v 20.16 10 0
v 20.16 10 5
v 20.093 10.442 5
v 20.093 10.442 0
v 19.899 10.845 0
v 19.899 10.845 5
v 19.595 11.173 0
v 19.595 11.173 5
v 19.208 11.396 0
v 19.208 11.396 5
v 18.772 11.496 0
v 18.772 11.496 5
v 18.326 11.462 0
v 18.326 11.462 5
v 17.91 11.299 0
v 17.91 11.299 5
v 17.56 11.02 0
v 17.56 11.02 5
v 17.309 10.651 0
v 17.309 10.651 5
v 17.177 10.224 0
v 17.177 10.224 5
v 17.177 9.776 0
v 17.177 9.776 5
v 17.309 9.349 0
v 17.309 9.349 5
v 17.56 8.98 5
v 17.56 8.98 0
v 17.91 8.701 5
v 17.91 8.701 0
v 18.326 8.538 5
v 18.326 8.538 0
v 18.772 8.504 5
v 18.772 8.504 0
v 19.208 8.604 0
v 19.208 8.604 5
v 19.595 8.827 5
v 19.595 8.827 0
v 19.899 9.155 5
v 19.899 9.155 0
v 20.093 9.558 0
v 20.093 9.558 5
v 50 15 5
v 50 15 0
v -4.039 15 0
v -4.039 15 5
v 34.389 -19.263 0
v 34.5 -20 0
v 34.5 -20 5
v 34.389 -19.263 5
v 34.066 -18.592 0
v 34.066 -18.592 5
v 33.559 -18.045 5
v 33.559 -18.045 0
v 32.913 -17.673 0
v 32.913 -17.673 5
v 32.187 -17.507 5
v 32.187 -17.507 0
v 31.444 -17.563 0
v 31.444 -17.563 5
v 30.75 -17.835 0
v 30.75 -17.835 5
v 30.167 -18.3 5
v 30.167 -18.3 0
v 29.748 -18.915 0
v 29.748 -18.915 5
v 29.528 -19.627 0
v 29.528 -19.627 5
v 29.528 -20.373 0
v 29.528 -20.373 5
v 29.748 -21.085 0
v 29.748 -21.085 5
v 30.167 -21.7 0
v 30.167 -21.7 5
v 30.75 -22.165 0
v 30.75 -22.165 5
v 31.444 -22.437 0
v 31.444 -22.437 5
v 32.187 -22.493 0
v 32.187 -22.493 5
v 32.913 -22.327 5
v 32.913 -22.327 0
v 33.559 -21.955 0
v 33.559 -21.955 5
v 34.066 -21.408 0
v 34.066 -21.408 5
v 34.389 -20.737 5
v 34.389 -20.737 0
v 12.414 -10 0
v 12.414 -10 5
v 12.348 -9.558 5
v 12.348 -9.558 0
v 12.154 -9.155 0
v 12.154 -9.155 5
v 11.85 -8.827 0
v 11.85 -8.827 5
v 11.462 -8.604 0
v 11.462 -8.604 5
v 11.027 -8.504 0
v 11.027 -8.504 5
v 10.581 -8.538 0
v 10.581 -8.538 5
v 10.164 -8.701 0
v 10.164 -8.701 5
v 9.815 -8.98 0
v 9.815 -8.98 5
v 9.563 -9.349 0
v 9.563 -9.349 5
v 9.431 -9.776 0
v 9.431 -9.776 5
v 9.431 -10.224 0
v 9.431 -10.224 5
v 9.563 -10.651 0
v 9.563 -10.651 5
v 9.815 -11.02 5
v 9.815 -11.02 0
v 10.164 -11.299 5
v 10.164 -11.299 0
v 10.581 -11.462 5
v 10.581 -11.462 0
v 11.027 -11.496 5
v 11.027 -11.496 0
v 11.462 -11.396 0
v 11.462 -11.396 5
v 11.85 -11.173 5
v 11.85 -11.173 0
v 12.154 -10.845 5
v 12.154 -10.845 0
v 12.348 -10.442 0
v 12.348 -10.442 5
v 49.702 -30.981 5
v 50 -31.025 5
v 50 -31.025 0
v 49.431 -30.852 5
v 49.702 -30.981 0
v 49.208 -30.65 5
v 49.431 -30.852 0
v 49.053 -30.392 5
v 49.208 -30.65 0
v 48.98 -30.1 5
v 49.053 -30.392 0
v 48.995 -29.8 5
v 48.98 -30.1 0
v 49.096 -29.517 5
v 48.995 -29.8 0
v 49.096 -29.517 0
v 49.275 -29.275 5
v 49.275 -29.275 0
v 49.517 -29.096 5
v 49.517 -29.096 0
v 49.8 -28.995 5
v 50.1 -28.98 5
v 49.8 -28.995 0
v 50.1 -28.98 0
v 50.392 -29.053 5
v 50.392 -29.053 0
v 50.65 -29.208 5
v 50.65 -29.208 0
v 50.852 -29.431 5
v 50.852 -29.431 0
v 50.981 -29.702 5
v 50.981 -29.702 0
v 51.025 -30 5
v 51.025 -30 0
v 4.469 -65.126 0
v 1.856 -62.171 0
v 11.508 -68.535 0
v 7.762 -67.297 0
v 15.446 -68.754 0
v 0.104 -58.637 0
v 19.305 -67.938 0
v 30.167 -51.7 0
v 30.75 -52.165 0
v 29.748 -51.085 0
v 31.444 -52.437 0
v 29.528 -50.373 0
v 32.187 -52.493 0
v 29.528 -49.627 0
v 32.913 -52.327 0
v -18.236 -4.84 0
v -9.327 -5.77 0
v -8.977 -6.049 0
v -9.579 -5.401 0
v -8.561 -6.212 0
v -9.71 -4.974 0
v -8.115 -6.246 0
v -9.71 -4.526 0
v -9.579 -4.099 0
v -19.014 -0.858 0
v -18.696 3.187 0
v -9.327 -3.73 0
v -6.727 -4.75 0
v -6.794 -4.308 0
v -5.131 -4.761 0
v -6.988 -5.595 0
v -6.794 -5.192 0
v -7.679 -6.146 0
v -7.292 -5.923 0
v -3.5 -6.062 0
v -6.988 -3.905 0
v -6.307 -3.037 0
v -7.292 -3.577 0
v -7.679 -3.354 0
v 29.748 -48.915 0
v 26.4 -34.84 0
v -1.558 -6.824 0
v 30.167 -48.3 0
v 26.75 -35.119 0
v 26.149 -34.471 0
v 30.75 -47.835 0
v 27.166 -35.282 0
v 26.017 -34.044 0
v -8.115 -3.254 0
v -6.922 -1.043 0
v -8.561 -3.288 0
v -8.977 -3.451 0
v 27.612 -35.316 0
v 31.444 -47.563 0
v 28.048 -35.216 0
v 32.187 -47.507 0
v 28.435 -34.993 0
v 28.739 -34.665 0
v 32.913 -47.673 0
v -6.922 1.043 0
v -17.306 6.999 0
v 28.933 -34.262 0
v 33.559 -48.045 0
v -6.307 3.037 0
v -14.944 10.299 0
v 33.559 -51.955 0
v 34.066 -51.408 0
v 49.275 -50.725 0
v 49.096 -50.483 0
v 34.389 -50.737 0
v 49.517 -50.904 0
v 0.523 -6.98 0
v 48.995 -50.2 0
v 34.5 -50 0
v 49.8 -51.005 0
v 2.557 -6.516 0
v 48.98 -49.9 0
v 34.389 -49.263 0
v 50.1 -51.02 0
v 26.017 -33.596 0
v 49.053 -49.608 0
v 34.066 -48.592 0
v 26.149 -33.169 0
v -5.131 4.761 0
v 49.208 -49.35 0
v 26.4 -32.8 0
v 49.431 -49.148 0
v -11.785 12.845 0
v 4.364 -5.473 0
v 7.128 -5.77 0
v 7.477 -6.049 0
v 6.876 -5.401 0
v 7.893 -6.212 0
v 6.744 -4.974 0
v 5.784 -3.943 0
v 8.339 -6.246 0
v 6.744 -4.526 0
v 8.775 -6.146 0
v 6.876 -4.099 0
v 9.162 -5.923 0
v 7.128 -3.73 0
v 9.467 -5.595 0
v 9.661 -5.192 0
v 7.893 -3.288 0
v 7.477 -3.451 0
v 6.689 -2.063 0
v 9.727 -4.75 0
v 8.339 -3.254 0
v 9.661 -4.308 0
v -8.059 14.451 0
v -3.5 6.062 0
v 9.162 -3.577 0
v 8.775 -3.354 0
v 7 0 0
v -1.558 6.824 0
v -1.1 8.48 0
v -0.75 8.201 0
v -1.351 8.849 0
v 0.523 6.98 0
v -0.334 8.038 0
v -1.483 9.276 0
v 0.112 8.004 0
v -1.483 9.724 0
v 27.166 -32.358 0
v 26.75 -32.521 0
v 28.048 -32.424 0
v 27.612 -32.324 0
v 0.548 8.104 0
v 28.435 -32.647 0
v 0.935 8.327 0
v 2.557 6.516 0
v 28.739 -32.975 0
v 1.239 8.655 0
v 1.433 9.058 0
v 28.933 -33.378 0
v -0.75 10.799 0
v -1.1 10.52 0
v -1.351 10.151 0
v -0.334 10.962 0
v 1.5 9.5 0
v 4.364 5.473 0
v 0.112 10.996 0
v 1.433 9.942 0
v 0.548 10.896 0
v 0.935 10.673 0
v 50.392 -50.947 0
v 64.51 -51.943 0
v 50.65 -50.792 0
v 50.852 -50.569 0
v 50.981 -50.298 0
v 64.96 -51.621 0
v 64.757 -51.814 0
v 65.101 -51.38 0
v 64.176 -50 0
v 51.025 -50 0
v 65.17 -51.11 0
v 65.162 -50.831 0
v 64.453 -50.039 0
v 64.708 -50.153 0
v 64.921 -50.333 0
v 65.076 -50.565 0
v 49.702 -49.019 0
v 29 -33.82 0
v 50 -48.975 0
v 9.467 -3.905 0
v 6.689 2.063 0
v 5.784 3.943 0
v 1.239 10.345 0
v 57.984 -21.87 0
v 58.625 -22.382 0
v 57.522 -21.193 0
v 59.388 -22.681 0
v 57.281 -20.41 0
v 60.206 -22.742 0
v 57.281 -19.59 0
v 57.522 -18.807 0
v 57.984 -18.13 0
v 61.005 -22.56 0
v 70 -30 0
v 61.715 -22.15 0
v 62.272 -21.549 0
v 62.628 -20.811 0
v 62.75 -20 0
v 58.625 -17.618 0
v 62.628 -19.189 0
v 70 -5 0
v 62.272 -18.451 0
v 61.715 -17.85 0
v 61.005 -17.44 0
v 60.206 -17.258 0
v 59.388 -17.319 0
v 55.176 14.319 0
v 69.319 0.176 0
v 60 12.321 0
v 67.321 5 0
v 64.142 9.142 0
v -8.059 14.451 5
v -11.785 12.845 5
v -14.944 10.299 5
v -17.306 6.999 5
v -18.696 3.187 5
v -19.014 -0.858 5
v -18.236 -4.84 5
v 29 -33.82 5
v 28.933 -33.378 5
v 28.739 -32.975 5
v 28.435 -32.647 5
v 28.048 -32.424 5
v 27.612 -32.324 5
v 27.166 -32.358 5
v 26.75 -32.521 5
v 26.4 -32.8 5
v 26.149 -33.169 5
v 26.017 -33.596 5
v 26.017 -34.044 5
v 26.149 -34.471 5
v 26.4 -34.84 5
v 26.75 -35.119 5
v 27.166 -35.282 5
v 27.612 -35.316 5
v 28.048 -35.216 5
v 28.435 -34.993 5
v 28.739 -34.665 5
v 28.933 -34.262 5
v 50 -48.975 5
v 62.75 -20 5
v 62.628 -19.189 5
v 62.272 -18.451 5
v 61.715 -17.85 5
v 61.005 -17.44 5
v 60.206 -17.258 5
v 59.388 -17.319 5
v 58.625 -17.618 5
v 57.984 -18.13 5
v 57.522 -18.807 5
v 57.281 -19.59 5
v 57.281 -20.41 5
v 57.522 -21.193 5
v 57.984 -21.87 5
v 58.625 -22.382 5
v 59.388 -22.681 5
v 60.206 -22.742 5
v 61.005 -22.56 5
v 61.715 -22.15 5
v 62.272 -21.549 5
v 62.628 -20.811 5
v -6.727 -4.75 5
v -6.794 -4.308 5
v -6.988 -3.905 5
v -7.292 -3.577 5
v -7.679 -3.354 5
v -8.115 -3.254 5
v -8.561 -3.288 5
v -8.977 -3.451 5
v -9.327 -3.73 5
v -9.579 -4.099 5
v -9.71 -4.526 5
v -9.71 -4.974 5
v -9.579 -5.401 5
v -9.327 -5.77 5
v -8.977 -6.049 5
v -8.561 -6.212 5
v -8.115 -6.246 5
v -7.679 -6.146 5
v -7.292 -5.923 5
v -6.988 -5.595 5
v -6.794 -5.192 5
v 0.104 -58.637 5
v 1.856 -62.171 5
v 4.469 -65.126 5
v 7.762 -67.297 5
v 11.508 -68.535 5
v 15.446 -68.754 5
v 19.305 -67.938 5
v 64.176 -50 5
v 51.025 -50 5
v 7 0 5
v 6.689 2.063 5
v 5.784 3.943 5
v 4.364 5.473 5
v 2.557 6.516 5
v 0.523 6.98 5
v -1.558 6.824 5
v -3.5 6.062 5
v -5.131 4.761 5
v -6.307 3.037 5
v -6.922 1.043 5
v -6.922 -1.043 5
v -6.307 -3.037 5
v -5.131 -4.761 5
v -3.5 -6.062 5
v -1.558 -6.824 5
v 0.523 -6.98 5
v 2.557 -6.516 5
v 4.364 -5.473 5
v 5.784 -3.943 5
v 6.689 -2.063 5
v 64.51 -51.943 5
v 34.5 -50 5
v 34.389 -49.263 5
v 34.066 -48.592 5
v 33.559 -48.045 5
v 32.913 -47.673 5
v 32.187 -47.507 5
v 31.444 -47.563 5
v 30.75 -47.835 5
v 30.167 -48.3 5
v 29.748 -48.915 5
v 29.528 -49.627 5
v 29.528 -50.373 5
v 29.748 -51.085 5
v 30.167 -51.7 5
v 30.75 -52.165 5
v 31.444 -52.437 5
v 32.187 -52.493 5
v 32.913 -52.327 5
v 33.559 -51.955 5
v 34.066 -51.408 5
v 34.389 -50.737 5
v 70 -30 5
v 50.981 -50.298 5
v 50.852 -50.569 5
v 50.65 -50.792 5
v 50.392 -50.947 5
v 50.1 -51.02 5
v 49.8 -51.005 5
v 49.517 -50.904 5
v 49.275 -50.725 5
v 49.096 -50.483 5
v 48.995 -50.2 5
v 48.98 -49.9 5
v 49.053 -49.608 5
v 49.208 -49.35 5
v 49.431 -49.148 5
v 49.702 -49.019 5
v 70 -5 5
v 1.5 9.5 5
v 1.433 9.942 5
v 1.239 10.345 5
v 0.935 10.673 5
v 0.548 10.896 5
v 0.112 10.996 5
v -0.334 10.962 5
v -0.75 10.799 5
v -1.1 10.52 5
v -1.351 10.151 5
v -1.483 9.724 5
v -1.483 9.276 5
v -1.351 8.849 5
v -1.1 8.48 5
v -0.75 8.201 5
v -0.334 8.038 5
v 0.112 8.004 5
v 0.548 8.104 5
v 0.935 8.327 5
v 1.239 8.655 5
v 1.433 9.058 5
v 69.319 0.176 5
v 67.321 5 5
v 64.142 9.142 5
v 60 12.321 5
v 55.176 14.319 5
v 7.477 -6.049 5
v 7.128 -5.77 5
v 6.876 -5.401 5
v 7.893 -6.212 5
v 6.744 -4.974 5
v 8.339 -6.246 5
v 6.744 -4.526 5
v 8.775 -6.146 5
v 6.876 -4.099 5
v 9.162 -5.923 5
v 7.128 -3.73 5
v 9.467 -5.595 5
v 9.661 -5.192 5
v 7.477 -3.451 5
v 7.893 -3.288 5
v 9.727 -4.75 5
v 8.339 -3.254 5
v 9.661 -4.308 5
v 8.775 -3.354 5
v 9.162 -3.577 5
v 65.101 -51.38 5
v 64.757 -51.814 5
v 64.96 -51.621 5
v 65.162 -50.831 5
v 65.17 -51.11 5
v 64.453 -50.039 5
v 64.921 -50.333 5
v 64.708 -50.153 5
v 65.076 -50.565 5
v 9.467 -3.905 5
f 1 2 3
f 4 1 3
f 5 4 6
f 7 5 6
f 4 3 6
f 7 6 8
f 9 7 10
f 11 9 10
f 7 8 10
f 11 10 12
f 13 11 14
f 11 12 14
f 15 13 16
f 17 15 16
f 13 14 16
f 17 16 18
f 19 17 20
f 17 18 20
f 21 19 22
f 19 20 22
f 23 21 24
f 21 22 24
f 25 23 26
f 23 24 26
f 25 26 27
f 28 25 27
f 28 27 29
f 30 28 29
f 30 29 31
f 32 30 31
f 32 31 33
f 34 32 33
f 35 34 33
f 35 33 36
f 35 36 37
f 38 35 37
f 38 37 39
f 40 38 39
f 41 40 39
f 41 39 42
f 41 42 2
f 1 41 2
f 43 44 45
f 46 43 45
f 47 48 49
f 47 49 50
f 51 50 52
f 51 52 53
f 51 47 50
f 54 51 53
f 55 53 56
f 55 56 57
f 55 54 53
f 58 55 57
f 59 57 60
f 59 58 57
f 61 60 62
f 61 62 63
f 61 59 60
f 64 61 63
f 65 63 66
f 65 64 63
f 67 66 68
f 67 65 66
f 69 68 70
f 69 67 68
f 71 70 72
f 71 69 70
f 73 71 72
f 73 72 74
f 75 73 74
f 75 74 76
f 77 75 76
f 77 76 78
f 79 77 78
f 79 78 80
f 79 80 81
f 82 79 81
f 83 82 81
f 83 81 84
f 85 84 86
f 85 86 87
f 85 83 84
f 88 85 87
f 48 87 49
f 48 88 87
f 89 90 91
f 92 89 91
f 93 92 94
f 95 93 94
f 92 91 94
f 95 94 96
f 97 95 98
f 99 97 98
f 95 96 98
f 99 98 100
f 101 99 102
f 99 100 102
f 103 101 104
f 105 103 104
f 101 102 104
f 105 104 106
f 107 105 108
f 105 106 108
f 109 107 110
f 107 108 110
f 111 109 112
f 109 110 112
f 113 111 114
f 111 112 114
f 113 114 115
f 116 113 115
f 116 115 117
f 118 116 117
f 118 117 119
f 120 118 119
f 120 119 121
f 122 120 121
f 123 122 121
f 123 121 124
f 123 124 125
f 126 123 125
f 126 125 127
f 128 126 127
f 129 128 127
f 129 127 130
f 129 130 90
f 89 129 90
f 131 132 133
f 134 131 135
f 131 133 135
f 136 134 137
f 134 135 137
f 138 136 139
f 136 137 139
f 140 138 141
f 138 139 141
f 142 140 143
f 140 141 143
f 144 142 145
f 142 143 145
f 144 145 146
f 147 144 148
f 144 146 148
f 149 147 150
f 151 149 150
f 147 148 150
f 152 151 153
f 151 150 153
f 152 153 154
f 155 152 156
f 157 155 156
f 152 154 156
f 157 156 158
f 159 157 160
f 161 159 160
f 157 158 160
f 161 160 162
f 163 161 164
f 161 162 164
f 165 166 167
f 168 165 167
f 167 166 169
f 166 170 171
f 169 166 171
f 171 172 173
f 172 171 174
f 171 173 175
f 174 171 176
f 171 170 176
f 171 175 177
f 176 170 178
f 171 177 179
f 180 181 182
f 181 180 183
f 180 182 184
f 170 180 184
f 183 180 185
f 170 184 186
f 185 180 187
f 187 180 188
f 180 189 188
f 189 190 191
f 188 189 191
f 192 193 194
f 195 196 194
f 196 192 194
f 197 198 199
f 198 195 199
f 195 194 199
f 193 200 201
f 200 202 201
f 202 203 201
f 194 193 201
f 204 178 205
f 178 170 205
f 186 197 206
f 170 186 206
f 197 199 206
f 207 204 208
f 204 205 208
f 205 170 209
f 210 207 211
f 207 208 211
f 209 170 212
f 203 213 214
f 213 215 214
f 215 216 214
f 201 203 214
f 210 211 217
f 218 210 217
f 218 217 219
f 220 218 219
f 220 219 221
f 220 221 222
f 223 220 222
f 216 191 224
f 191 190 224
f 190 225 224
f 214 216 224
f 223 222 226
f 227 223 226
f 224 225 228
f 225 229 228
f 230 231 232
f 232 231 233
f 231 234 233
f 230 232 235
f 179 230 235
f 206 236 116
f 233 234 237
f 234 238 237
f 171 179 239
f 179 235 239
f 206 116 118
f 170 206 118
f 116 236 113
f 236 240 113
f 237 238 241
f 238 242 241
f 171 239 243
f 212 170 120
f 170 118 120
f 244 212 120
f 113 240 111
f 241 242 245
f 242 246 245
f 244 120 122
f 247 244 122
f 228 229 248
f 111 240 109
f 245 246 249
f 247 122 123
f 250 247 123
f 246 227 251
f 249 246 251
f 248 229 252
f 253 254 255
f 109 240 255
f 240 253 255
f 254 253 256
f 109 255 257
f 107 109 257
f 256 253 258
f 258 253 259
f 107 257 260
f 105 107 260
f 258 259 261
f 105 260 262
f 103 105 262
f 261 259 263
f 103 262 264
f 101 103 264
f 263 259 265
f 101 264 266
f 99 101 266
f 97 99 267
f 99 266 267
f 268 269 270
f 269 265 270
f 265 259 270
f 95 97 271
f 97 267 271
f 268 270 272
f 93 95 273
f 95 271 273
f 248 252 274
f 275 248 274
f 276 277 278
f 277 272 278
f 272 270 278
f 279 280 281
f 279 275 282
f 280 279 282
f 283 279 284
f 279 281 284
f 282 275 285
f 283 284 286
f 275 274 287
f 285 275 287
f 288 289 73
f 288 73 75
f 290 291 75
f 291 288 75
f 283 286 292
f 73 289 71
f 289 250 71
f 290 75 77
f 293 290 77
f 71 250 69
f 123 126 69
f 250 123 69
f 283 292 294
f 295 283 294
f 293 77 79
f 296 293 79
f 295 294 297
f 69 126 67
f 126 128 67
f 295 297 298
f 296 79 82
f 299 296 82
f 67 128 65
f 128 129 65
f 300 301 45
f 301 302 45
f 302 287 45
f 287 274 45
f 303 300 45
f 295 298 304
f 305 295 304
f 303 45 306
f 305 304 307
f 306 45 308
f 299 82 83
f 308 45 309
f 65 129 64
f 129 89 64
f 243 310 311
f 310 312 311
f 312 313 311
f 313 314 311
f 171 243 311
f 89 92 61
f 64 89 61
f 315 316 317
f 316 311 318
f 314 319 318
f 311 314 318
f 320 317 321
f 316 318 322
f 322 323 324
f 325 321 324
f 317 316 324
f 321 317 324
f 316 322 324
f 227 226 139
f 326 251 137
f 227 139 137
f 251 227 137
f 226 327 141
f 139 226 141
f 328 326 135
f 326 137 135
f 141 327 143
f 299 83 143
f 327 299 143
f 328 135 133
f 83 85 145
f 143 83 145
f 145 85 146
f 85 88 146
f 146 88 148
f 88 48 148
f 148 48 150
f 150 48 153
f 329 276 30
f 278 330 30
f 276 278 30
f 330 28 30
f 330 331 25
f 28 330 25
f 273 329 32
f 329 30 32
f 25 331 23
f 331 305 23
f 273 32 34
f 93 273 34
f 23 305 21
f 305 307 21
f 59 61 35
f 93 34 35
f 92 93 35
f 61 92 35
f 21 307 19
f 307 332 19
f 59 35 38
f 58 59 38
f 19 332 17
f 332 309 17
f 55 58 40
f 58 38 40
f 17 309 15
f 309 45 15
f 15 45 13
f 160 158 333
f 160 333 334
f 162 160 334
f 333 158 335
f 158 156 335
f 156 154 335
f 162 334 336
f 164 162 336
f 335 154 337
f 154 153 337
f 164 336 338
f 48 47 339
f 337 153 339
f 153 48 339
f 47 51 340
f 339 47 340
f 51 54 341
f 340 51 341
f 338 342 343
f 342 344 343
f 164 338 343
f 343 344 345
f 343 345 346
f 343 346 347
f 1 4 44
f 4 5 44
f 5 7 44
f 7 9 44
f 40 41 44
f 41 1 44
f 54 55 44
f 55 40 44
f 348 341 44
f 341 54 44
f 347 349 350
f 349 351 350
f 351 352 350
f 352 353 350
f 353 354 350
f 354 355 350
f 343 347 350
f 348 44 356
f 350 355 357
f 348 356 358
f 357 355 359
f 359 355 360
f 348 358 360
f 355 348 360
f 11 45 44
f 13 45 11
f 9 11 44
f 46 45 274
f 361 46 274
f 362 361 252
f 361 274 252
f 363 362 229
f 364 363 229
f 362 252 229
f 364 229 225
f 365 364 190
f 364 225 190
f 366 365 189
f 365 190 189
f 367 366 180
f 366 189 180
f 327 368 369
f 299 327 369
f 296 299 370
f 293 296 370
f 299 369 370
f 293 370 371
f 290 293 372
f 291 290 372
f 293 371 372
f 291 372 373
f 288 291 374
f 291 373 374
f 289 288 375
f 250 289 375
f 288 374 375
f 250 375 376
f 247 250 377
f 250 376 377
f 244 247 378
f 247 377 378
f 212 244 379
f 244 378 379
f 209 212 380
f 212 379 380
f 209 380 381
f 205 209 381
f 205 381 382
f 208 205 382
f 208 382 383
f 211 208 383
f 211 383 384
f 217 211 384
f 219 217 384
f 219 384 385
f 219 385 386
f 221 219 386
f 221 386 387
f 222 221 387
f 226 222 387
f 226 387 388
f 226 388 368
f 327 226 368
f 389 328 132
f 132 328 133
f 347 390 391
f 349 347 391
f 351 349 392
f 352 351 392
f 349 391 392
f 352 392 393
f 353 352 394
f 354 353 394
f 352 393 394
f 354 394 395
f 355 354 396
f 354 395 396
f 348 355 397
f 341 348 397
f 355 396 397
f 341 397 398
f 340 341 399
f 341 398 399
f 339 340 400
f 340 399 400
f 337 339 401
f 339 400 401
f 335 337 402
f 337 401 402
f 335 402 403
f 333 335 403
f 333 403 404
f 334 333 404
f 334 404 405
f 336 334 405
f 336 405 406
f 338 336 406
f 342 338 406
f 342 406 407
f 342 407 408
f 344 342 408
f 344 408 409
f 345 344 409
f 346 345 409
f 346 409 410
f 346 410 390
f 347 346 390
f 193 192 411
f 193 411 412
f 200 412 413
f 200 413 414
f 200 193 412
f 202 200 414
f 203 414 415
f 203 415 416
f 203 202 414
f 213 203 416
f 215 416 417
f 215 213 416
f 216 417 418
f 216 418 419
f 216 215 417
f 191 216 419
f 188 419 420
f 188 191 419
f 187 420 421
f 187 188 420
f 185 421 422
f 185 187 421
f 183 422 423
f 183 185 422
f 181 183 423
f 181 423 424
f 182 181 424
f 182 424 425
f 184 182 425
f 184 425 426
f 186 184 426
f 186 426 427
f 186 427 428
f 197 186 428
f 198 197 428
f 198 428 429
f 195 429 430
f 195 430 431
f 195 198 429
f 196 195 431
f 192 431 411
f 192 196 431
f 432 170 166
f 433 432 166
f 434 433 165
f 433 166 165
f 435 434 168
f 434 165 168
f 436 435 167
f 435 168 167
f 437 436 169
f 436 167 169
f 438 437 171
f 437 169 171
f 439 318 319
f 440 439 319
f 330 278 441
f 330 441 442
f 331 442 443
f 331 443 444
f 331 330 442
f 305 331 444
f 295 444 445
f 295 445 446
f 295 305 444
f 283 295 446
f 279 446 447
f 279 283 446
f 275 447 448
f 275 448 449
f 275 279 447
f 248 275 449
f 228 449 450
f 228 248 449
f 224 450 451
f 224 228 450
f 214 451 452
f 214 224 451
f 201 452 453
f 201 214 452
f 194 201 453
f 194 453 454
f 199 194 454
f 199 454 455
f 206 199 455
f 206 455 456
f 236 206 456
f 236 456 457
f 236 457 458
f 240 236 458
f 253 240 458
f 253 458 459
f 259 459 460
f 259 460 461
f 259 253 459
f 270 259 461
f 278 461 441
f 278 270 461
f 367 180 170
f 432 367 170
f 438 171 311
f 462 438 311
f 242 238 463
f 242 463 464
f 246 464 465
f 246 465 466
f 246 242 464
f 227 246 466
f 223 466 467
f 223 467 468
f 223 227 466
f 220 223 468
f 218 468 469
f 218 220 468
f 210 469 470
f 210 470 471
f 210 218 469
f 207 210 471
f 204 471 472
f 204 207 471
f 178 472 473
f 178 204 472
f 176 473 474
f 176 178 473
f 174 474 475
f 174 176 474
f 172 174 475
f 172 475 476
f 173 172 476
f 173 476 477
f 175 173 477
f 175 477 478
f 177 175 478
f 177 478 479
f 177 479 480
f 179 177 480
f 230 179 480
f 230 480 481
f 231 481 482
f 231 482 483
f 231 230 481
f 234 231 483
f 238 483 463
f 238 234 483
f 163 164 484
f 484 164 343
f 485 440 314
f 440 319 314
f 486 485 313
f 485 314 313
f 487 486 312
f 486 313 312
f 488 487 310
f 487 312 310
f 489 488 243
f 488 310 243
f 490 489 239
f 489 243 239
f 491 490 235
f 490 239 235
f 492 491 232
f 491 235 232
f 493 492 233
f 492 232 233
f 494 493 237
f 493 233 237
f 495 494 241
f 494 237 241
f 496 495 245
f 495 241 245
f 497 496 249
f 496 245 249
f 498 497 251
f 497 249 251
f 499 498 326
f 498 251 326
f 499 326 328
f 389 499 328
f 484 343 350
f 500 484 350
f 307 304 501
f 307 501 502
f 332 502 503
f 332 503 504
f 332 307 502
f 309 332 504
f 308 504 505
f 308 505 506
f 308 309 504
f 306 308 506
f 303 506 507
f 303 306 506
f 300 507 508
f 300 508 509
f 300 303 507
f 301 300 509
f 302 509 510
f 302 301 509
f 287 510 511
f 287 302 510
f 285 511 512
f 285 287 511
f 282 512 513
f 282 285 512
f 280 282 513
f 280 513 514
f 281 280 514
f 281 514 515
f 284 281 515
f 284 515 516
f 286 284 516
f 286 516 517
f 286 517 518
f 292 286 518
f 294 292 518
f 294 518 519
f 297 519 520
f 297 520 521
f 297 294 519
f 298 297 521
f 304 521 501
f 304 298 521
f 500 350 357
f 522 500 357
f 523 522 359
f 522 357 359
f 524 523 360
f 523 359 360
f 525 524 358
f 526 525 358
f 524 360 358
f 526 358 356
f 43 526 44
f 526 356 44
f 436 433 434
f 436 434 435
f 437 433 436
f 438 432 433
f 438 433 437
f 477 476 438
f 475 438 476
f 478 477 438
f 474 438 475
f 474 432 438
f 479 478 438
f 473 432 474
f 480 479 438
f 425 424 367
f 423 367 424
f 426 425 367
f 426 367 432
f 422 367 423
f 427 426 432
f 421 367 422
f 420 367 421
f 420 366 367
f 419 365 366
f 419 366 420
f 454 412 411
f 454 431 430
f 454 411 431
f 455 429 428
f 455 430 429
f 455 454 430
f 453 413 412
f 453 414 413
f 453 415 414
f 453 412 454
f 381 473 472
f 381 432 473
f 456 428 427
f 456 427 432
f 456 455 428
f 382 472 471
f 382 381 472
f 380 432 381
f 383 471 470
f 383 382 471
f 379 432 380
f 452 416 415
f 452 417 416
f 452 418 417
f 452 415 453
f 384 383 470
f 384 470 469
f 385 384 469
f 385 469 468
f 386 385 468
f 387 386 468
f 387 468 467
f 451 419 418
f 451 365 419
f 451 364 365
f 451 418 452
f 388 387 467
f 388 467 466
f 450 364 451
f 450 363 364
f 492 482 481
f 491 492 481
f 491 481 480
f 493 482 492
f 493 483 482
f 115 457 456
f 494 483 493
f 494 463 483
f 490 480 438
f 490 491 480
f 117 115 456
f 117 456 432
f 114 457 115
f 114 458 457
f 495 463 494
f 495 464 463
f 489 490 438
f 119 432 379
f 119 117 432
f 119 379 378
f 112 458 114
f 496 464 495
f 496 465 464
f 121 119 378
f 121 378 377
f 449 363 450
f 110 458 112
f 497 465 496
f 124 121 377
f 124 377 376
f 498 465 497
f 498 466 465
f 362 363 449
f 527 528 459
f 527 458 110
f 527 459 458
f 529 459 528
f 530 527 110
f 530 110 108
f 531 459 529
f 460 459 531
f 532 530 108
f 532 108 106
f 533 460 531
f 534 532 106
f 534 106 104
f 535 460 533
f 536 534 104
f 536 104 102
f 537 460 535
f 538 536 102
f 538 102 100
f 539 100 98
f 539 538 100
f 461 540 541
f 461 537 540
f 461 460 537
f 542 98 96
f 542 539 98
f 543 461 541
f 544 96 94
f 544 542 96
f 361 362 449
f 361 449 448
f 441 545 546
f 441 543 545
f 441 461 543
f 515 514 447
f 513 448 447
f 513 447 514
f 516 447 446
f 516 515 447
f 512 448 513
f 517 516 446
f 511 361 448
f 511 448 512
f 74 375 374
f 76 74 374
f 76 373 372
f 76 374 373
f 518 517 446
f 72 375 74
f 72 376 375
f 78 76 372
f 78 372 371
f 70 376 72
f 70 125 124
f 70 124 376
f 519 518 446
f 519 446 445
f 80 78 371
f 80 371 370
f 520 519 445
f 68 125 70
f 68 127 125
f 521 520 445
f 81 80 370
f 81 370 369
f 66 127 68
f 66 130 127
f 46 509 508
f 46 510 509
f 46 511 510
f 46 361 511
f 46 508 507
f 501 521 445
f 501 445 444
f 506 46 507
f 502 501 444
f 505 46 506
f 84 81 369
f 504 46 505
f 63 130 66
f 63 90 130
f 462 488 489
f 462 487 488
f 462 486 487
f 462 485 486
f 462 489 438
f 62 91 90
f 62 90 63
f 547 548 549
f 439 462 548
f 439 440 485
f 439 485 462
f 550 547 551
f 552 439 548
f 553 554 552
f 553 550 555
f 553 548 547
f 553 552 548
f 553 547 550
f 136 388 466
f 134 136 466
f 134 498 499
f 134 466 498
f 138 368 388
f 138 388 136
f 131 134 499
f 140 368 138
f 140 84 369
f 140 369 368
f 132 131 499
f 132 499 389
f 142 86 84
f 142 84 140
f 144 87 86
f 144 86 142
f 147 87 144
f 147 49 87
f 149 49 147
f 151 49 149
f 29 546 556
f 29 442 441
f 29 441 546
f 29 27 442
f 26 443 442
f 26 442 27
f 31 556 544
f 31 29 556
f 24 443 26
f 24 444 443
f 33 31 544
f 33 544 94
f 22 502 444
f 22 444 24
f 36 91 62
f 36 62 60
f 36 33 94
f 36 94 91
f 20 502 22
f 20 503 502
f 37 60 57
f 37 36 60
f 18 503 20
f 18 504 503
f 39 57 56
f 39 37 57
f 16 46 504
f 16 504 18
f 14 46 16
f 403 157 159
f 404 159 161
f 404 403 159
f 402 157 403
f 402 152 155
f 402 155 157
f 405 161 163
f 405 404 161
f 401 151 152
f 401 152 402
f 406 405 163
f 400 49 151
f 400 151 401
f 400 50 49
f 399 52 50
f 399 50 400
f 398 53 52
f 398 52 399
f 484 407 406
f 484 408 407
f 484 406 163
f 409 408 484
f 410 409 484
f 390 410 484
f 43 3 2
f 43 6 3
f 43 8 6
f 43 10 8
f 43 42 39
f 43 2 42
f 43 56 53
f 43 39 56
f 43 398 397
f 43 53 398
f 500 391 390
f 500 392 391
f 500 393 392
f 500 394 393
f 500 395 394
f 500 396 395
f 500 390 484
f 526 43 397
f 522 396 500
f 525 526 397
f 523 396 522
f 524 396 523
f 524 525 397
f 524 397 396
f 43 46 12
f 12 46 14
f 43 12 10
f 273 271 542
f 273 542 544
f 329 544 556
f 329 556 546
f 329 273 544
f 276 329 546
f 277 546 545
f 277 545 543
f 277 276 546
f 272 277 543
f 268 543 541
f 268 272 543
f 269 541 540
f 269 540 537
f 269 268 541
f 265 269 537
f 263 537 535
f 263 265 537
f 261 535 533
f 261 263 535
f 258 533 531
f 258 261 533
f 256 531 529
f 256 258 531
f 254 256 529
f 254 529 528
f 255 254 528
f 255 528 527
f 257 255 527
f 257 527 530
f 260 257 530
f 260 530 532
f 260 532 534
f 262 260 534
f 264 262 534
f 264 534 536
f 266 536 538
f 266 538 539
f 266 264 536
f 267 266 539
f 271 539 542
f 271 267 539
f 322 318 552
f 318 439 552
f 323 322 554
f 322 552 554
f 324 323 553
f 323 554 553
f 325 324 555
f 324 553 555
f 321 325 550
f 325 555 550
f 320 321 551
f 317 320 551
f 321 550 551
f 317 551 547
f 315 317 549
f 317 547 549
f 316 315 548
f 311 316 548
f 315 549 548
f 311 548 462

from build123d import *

# Parameters (mm, degrees)
SKETCH_1_R          = 7
SKETCH_1_R_2        = 1.5
SKETCH_1_R_3        = 2.5
EXTRUDE_1_DEPTH     = 5
FILLET_1_R          = 1
SKETCH_2_R          = 1.5
SKETCH_2_R_2        = 2.75
CUT_EXTRUDE_1_DEPTH = 10
SKETCH_3_R          = 1.5
CUT_EXTRUDE_2_DEPTH = 10
SKETCH_4_R          = 1.025
CUT_EXTRUDE_3_DEPTH = 30


with BuildPart() as part:
    # 草图1 → 凸台-拉伸1 (new body)
    with BuildSketch(Plane.XY):
        with BuildLine():
            Line((70, -30), (70, -5))
            ThreePointArc((70, -5), (64.142135624, 9.142135624), (50, 15))
            Line((50, 15), (-4.038673683, 15))
            ThreePointArc((-4.038673683, 15), (-16.237067712, 8.729214347), (-18.236326506, -4.840108917))
            Line((-18.236326506, -4.840108917), (0.10369211, -58.637496855))
            ThreePointArc((0.10369211, -58.637496855), (7.762372735, -67.297085809), (19.305024689, -67.938222033))
            Line((19.305024689, -67.938222033), (70, -50))
            Line((70, -50), (50, -50))
            Line((50, -50), (50, -30))
            Line((50, -30), (70, -30))
        make_face()
        Circle(SKETCH_1_R, mode=Mode.SUBTRACT)
        with Locations((0, 9.5)):
            Circle(SKETCH_1_R_2, mode=Mode.SUBTRACT)
        with Locations((8.227241336, -4.75)):
            Circle(SKETCH_1_R_2, mode=Mode.SUBTRACT)
        with Locations((-8.227241336, -4.75)):
            Circle(SKETCH_1_R_2, mode=Mode.SUBTRACT)
        with Locations((32, -50)):
            Circle(SKETCH_1_R_3, mode=Mode.SUBTRACT)
        with Locations((32, -20)):
            Circle(SKETCH_1_R_3, mode=Mode.SUBTRACT)
    extrude(amount=EXTRUDE_1_DEPTH)

    # 圆角1
    fillet_1_edges = [part.edges().sort_by_distance(p)[0] for p in [
        (70, -50, 2.5),
    ]]
    fillet(fillet_1_edges, radius=FILLET_1_R)

    # 草图2 → 切除-拉伸1 (cut)
    with BuildSketch(Plane.XY.offset(5)):
        with Locations((27.5, -33.82)):
            Circle(SKETCH_2_R)
        with Locations((18.66, 10)):
            Circle(SKETCH_2_R)
        with Locations((60, -20)):
            Circle(SKETCH_2_R_2)
    extrude(amount=-CUT_EXTRUDE_1_DEPTH, mode=Mode.SUBTRACT)

    # 草图3 → 切除-拉伸2 (cut)
    with BuildSketch(Plane.XY.offset(5)):
        with Locations((10.914424012, -10)):
            Circle(SKETCH_3_R)
    extrude(amount=-CUT_EXTRUDE_2_DEPTH, mode=Mode.SUBTRACT)

    # 草图4 → 切除-拉伸3 (cut, symmetric)
    with BuildSketch(Plane(origin=(0, 0, 0), x_dir=(-1, 0, 0), z_dir=(0, 0, -1))):
        with Locations((-50, -50)):
            Circle(SKETCH_4_R)
        with Locations((-50, -30)):
            Circle(SKETCH_4_R)
    extrude(amount=CUT_EXTRUDE_3_DEPTH, both=True, mode=Mode.SUBTRACT)


solid = part.part
